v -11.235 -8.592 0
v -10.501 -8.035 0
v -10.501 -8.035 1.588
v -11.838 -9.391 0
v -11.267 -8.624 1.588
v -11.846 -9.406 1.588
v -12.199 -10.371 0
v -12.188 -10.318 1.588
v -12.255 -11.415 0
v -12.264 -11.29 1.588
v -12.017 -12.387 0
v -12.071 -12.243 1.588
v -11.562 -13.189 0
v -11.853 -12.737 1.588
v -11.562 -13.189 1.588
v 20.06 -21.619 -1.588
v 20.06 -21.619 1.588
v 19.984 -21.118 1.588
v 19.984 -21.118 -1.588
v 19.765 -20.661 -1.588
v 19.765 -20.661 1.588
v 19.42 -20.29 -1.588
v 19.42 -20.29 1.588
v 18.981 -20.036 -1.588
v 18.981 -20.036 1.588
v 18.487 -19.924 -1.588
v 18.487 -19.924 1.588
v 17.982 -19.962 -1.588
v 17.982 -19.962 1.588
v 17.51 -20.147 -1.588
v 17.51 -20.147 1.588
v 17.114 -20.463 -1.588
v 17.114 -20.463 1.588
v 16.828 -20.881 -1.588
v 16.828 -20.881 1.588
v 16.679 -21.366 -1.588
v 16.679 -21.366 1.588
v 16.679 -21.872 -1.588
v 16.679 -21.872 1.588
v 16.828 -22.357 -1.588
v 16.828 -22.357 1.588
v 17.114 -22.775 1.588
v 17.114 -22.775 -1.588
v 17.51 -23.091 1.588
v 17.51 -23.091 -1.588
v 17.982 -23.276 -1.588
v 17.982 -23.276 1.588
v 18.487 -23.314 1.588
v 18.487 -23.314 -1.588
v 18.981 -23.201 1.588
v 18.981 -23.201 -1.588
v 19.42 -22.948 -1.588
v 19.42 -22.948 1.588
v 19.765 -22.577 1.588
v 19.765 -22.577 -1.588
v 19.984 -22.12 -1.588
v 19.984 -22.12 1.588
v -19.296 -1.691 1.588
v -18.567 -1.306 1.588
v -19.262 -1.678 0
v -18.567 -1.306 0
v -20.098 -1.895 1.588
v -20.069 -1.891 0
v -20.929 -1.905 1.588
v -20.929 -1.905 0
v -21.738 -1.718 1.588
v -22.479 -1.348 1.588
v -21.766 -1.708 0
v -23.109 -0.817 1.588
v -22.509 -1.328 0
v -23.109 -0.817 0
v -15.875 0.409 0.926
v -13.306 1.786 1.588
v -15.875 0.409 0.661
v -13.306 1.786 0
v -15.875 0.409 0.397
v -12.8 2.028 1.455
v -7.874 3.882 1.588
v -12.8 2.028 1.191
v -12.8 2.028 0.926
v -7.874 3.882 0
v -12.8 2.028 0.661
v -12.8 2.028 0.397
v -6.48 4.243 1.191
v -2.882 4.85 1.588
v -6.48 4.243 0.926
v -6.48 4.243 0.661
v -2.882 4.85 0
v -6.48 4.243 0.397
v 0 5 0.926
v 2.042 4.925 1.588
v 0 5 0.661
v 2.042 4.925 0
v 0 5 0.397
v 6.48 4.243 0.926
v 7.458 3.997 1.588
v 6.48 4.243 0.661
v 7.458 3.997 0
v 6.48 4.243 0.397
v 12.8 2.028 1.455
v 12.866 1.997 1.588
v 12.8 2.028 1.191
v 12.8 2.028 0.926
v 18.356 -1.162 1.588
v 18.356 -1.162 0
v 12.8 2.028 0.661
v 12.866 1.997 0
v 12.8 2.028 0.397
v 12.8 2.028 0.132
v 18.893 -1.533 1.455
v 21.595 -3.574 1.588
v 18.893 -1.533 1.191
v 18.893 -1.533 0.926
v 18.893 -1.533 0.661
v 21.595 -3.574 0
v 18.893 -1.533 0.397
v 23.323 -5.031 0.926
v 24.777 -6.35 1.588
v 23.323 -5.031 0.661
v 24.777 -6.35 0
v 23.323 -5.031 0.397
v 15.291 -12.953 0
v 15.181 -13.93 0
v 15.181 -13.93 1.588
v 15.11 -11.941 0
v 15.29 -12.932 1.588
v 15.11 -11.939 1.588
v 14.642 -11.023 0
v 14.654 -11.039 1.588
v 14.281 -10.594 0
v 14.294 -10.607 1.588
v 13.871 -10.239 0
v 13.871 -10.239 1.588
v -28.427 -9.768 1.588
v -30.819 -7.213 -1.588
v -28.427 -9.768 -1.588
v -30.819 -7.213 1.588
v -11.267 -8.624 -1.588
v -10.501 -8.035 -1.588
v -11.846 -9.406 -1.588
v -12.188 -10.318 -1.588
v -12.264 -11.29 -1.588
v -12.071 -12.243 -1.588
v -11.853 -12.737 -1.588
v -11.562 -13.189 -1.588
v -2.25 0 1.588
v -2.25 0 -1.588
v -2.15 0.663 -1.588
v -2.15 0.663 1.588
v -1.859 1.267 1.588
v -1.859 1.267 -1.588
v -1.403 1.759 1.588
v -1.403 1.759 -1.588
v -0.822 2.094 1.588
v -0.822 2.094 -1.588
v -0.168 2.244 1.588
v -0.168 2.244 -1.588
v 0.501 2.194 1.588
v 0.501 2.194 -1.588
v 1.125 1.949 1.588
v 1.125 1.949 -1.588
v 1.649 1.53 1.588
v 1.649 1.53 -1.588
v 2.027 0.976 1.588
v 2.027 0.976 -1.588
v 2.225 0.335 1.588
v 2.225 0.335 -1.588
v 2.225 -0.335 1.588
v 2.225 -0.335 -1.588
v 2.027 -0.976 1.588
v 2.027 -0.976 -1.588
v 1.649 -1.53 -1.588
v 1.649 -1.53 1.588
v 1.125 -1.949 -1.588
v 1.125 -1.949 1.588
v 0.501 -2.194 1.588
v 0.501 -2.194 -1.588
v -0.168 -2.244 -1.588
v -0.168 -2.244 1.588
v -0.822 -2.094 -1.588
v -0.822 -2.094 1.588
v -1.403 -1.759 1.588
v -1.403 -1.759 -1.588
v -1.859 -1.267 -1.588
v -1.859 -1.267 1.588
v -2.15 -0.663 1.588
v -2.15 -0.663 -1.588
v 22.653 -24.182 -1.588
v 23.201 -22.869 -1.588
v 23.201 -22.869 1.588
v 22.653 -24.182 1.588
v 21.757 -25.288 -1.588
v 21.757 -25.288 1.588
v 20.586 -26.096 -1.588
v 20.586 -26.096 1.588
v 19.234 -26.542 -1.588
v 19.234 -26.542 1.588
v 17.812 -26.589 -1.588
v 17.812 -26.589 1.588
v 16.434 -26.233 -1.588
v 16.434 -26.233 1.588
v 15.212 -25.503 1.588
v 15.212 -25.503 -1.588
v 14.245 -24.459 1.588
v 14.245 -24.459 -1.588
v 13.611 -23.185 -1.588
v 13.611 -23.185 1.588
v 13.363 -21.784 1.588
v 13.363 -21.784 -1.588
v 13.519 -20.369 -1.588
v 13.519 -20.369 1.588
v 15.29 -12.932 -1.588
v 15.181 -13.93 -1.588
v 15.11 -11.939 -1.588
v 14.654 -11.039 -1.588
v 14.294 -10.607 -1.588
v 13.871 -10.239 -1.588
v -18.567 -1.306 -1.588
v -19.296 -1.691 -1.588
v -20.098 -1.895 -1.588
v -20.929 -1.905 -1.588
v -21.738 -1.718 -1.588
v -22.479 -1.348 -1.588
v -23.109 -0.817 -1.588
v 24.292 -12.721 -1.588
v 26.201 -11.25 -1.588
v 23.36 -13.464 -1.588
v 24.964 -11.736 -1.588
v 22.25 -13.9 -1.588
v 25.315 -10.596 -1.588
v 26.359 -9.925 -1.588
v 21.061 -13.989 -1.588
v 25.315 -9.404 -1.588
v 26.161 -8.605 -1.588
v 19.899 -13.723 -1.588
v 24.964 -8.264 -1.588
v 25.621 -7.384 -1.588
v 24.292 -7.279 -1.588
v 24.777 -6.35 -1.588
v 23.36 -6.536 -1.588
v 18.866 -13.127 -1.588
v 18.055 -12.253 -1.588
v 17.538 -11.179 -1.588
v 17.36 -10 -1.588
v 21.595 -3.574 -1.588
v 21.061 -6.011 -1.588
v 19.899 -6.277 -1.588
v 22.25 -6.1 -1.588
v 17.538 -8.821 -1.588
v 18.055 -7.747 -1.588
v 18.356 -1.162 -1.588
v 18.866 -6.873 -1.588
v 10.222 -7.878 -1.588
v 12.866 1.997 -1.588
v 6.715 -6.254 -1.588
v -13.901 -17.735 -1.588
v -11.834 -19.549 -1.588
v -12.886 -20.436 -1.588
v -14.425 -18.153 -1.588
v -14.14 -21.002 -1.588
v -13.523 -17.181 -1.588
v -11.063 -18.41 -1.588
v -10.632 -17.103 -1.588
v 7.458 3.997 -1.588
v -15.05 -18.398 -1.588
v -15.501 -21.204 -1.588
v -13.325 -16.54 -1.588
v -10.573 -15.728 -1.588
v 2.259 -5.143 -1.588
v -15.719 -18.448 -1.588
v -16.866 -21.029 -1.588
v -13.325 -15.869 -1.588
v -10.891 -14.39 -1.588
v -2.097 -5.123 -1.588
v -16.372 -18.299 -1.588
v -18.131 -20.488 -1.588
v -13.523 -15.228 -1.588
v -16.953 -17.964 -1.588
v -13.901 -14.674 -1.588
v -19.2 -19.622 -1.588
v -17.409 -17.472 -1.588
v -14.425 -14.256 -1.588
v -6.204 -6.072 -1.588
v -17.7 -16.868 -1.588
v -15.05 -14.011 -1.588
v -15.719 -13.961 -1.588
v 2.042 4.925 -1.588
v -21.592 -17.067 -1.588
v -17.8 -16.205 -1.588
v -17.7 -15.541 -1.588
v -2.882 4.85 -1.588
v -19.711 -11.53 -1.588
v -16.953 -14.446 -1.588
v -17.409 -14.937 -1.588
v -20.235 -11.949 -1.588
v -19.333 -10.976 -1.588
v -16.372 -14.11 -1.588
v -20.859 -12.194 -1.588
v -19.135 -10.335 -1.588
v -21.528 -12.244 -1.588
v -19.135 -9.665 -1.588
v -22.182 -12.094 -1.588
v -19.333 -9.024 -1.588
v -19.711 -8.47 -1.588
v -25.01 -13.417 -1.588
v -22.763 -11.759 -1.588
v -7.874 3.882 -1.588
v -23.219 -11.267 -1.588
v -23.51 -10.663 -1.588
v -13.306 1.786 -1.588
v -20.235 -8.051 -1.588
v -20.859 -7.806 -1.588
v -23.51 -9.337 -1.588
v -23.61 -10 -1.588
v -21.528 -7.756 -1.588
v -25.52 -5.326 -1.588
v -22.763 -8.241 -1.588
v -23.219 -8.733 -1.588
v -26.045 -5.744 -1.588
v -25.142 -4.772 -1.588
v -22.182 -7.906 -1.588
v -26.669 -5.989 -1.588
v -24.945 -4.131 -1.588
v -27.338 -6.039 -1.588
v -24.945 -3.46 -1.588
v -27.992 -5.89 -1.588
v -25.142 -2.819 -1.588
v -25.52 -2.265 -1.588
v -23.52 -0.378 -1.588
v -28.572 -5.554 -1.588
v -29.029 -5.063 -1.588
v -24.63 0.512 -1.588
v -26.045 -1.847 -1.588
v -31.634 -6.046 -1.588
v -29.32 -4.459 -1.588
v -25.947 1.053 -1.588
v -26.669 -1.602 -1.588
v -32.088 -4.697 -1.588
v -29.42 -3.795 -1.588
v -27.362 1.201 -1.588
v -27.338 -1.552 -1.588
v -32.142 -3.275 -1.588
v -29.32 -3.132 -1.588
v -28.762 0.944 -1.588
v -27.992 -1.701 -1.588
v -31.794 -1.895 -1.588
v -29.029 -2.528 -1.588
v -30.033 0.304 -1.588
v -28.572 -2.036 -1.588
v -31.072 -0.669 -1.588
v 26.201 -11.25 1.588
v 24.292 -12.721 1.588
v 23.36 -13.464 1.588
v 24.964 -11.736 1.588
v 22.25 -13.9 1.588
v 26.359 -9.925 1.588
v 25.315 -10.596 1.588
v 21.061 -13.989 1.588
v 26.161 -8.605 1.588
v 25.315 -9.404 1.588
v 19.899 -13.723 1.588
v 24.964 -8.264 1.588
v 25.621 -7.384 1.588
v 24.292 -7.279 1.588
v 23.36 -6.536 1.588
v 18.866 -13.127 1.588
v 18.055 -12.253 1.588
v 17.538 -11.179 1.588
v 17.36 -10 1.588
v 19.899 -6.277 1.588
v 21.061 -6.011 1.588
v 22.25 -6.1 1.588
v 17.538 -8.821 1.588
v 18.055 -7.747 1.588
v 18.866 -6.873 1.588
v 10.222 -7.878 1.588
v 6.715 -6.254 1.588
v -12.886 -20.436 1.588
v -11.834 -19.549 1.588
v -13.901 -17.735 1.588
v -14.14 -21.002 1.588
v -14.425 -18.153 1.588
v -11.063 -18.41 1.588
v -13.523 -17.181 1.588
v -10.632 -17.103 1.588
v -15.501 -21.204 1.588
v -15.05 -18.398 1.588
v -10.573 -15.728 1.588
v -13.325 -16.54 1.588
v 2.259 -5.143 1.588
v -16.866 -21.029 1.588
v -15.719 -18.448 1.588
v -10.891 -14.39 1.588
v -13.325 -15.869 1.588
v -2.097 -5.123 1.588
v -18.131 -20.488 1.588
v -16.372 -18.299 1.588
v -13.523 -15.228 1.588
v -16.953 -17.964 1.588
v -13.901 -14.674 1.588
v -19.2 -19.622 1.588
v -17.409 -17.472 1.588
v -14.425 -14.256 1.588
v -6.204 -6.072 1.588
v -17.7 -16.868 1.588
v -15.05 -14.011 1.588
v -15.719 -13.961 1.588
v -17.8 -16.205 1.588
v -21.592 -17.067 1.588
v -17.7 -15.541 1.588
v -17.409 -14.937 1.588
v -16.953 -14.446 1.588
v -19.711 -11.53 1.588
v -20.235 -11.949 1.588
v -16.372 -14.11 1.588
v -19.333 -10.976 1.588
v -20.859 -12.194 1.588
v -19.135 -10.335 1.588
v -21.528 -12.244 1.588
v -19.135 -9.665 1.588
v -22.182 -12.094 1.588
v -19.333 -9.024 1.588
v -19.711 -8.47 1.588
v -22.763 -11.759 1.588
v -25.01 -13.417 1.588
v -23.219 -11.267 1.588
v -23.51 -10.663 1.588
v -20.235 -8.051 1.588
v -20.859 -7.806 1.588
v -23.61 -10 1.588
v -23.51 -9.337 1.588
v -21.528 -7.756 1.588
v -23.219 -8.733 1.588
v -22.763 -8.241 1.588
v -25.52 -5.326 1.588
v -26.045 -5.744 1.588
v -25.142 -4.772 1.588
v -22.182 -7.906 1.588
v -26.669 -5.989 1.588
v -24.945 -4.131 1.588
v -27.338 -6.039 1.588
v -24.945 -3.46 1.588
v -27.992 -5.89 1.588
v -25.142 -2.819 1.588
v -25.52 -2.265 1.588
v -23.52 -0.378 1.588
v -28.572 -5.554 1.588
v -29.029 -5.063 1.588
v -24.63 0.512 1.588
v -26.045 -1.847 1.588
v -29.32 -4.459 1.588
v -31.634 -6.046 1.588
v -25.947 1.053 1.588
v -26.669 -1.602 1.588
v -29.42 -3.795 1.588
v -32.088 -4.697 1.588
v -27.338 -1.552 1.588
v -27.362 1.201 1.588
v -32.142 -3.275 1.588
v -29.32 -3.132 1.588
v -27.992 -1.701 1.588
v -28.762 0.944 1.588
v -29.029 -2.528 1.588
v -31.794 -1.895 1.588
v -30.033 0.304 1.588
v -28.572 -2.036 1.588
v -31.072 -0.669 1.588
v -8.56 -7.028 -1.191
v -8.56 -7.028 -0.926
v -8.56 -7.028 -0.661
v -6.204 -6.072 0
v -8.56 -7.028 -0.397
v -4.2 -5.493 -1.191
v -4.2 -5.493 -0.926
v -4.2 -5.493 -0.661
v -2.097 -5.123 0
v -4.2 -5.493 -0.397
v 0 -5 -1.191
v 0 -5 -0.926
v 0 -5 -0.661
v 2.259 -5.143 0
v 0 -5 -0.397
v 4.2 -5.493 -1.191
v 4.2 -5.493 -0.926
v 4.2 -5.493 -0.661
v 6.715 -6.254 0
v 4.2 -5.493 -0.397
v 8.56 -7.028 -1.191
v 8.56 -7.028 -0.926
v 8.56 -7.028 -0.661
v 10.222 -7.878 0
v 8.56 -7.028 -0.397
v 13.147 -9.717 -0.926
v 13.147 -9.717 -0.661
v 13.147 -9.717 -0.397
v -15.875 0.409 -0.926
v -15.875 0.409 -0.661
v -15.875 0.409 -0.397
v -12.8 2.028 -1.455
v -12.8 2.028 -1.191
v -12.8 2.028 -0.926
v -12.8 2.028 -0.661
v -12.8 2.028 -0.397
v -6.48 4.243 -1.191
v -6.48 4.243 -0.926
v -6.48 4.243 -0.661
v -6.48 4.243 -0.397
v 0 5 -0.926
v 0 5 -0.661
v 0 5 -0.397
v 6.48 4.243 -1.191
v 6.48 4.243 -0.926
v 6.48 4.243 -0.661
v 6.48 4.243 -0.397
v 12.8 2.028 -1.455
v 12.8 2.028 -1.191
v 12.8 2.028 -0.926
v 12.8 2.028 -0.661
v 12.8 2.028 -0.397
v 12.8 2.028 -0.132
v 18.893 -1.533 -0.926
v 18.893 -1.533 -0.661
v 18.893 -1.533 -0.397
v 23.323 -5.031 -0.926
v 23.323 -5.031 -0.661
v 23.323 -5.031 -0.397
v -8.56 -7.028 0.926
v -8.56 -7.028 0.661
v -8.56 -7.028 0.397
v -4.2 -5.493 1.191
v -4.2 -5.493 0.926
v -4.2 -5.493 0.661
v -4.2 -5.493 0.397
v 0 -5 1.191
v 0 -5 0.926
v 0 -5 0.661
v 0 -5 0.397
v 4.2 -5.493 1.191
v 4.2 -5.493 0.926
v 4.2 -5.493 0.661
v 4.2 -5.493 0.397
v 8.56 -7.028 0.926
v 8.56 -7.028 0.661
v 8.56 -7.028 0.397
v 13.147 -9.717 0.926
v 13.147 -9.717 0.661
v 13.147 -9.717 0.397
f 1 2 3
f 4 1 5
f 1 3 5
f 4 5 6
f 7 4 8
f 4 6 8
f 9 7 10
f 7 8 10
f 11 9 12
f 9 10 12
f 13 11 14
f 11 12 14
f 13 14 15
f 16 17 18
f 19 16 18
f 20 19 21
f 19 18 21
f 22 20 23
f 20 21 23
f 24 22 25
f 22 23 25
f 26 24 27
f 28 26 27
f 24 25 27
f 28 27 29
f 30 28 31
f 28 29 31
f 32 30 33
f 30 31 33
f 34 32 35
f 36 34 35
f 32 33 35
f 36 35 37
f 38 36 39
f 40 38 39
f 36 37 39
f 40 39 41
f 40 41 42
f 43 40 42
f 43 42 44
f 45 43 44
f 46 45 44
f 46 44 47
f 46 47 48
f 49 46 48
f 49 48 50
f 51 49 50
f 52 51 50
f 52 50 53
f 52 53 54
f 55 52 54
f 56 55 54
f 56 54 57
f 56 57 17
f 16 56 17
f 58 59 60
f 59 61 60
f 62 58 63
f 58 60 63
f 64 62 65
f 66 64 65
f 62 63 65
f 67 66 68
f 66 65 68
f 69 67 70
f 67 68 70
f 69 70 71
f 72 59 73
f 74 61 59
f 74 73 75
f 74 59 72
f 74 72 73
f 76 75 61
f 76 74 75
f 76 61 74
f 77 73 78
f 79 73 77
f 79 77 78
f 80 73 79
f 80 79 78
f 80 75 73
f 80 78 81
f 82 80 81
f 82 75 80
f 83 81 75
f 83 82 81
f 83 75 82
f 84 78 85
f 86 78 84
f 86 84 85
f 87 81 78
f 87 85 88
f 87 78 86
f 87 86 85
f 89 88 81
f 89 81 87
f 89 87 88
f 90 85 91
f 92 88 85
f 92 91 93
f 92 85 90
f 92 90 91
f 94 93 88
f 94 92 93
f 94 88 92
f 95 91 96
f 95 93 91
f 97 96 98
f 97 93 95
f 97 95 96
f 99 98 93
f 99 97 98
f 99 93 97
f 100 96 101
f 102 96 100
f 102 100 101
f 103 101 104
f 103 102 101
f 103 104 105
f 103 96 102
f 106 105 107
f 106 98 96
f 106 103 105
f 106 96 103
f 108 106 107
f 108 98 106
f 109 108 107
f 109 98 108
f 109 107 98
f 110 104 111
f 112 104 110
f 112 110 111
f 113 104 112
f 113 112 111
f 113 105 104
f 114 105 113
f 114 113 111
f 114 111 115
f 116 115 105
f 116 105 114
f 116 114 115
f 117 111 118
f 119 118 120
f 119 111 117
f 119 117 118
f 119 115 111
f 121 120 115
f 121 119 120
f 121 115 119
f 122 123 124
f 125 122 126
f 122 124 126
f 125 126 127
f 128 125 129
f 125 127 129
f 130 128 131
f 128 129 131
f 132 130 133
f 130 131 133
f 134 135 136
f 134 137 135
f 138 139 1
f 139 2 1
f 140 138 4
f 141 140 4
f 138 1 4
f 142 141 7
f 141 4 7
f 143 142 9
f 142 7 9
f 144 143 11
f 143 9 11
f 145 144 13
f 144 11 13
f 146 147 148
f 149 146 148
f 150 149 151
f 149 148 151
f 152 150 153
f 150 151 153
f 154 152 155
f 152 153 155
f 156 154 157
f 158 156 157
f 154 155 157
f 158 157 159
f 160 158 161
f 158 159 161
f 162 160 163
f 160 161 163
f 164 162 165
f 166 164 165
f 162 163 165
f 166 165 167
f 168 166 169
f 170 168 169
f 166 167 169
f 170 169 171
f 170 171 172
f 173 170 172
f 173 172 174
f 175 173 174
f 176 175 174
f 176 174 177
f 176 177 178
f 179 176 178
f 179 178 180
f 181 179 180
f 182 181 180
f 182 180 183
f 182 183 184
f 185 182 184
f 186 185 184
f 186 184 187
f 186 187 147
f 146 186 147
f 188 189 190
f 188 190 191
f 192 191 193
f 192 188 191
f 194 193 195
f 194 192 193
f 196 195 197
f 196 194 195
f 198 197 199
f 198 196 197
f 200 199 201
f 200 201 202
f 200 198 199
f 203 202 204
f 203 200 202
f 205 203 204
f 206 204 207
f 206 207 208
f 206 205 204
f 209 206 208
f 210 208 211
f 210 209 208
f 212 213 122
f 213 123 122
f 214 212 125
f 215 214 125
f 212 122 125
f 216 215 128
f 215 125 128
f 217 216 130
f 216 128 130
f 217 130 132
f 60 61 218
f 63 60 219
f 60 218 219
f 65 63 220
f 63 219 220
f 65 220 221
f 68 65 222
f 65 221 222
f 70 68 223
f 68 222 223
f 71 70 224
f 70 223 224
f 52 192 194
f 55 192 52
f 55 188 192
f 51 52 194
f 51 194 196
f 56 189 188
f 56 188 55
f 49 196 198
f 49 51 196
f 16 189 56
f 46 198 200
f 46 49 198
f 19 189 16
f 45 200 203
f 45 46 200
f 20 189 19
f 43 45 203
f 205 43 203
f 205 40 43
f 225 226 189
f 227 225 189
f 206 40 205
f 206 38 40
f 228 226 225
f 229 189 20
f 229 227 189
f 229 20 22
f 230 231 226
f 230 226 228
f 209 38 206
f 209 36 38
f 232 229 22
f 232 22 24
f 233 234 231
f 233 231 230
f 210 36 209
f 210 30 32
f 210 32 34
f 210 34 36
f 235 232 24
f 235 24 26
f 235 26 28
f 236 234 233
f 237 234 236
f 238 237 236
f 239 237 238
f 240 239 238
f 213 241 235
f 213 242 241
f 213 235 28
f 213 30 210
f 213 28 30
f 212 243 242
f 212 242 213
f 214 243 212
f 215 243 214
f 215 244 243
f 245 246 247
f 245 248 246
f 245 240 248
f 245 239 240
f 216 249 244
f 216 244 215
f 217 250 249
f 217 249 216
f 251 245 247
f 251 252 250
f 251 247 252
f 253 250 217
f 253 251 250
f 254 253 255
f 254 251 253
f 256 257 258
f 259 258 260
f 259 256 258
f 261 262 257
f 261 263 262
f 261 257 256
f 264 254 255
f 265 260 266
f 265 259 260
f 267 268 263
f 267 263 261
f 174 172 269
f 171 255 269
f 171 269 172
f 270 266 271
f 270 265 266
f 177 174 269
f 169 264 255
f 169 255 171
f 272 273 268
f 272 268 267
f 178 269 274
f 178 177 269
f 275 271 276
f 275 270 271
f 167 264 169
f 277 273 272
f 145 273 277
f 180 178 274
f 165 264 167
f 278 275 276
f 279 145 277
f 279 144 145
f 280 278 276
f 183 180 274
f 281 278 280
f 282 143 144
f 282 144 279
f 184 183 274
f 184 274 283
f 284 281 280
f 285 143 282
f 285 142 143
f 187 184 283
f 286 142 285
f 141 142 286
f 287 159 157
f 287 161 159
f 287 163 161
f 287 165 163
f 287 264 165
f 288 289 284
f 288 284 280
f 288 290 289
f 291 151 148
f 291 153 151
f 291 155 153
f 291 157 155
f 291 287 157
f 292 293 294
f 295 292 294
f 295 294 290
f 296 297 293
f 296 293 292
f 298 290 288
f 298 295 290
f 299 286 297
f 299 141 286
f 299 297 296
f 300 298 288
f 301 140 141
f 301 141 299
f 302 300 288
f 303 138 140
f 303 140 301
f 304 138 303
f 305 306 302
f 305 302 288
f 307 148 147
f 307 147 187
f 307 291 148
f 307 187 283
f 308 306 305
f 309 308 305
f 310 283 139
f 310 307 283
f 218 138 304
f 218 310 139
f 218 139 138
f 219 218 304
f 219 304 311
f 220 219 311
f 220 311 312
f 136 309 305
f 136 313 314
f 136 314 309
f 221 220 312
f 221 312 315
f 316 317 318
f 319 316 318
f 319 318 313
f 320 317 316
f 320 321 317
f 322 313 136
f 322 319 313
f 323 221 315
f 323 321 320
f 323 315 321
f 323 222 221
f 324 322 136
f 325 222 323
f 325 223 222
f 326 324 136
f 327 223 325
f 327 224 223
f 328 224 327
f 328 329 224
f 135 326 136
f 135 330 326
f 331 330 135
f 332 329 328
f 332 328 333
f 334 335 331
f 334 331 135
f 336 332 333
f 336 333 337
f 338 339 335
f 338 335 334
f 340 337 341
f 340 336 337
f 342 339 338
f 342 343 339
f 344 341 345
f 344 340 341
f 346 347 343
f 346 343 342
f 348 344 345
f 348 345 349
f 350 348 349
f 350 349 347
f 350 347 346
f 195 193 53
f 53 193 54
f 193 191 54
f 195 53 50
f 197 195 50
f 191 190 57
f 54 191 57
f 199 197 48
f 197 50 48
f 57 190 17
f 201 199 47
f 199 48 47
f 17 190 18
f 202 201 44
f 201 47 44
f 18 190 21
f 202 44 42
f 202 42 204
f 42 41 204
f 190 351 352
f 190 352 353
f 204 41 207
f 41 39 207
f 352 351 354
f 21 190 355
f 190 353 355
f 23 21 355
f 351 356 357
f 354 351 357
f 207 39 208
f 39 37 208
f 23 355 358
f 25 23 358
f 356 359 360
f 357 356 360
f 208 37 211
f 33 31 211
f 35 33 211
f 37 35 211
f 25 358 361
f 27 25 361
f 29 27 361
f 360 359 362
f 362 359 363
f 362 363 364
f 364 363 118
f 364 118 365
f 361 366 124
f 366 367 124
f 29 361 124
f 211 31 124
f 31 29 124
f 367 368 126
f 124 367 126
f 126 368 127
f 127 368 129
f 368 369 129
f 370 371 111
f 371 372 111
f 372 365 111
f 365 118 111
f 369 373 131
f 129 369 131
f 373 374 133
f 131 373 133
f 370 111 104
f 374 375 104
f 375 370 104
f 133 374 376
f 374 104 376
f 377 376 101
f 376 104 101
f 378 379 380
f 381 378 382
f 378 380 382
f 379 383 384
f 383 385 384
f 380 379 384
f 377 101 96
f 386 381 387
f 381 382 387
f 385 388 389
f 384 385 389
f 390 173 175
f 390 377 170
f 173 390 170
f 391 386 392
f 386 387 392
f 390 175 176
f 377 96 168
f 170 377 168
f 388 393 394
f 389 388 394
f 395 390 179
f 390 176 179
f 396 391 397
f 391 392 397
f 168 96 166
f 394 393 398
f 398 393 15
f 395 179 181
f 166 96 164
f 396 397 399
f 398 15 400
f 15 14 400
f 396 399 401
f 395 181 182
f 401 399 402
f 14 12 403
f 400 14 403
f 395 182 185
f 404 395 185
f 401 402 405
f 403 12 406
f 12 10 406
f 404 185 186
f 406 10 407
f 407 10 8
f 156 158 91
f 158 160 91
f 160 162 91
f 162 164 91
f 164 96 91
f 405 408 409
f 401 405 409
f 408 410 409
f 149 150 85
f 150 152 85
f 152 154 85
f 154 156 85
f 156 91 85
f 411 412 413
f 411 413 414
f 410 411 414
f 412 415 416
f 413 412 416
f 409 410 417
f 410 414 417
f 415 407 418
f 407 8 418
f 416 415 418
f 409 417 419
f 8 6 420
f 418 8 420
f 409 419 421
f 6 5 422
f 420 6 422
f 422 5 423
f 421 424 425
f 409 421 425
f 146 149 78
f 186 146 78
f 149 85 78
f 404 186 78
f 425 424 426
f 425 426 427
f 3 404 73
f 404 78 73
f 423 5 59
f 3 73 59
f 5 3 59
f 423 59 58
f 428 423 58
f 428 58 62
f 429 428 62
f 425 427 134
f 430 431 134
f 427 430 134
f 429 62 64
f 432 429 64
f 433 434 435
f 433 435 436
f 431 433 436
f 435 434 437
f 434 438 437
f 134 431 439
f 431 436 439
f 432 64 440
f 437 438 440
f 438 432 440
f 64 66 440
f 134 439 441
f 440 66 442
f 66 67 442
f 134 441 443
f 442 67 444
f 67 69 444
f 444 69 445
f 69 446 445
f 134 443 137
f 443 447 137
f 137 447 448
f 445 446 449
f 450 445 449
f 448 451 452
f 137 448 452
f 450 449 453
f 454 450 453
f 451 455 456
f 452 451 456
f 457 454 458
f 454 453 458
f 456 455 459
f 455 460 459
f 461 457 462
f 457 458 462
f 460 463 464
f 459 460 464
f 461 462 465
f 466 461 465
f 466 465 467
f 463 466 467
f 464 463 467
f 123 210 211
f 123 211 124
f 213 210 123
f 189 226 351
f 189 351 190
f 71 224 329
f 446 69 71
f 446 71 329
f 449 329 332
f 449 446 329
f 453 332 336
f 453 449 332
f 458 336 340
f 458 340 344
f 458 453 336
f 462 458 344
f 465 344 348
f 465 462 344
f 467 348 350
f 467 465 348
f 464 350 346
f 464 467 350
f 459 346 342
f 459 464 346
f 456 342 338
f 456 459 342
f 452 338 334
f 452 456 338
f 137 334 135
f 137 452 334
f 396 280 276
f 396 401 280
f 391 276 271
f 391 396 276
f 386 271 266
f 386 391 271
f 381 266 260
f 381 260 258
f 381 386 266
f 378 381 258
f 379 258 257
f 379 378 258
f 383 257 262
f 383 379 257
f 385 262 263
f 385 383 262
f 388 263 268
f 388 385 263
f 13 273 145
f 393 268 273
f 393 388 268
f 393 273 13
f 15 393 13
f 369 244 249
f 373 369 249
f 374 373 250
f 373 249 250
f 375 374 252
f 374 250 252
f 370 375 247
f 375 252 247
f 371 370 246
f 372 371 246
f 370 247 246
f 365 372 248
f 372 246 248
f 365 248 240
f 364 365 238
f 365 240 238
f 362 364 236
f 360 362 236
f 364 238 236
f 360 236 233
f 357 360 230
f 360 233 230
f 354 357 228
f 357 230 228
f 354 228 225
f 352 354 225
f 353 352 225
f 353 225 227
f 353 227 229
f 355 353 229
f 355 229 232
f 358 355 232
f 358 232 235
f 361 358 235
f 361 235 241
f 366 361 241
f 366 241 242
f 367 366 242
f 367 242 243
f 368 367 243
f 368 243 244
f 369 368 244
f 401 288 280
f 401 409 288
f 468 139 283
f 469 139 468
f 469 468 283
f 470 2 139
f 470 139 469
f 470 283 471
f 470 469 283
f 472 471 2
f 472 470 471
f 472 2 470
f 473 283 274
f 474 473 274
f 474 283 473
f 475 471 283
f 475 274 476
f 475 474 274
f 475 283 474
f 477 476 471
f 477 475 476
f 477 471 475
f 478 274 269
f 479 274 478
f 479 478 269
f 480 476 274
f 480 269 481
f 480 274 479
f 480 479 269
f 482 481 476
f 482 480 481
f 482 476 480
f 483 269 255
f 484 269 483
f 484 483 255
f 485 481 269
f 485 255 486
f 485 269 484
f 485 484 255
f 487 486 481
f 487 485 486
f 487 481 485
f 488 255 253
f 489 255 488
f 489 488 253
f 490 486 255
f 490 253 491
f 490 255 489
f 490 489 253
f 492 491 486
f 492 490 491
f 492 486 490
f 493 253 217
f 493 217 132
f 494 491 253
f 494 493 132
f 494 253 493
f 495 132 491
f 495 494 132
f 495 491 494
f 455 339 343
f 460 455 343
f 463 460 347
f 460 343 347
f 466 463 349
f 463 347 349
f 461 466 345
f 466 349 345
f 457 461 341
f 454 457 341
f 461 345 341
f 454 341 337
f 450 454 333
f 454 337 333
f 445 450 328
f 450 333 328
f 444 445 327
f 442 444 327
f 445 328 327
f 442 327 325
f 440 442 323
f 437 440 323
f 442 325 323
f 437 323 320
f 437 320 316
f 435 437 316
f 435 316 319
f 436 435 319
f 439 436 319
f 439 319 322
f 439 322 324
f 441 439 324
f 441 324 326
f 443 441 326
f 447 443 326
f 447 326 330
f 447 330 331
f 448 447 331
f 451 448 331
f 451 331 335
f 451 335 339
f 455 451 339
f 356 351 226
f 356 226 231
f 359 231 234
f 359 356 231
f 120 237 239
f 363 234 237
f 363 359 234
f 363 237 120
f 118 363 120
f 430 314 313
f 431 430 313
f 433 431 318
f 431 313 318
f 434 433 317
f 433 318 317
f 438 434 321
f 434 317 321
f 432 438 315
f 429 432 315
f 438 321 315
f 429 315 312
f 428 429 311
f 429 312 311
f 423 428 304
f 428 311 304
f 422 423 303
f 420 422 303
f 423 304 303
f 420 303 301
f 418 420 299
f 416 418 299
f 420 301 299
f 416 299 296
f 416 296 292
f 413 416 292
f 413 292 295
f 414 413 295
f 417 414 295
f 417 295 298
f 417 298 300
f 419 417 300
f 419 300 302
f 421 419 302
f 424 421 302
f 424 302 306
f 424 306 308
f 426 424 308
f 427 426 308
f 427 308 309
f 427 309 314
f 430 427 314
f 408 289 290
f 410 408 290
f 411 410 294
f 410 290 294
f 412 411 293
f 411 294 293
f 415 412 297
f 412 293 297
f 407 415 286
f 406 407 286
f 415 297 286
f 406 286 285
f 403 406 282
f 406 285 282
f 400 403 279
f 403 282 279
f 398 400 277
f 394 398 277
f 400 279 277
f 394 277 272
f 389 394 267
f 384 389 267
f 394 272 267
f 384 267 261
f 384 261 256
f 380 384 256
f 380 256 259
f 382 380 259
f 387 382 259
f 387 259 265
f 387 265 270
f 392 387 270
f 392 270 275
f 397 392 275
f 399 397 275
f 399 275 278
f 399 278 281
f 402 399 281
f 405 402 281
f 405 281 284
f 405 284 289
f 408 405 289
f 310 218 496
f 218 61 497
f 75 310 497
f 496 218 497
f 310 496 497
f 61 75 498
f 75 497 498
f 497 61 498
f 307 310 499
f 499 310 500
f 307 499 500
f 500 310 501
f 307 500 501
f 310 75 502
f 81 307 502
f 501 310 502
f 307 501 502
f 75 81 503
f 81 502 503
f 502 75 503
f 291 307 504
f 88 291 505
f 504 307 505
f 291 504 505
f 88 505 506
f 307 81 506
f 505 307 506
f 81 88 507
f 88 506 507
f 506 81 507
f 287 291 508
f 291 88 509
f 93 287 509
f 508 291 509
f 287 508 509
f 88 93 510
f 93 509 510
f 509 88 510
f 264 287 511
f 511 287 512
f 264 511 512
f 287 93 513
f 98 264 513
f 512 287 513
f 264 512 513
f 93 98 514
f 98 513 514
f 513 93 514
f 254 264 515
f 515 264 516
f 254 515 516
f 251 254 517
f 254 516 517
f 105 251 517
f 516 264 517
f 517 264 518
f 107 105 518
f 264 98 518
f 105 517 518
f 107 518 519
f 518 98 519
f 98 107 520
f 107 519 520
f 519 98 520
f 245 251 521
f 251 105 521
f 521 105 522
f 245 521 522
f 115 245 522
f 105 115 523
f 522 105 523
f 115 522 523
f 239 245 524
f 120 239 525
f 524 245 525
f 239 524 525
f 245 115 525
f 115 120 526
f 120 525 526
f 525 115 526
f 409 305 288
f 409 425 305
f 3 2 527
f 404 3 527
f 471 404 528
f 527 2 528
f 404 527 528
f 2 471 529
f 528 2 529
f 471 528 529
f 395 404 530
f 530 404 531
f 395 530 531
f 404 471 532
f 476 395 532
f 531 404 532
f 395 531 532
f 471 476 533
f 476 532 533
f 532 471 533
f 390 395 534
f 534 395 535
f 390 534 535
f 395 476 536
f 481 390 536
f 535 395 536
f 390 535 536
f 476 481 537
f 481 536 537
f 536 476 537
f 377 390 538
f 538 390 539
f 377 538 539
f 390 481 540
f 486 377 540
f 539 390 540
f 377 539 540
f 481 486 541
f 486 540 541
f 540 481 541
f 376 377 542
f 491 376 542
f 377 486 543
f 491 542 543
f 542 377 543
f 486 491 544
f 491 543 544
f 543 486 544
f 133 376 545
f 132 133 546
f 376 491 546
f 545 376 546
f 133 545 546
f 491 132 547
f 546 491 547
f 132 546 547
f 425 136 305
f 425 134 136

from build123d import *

# Parameters (mm, degrees)
BOSS_EXTRUDE1_DEPTH  = 1.5875
M4_CLEARANCE_HOLE1_D = 4.5
BOSS_EXTRUDE2_DEPTH  = 3.175
M3_CLEARANCE_HOLE1_D = 3.4
FILLET1_R            = 3.5
SKETCH8_R            = 4
CUT_EXTRUDE1_DEPTH   = 4.1750001


with BuildPart() as part:
    # Sketch2 → Boss-Extrude1 (new body, symmetric)
    with BuildSketch(Plane.XY):
        with BuildLine():
            add(Edge.make_bspline(
                [(-24.777431429, -6.350183234), (-24.299810251, -5.902972393), (-23.32289496, -5.01651393), (-22.058866471, -3.944003435), (-21.276036232, -3.316259916), (-20.98344634, -3.086723573)],
                knots=[0, 0, 0, 0, 0.03125, 0.0625, 0.081068463, 0.081068463, 0.081068463, 0.081068463], degree=3))
            Line((-24.777431429, -6.350183234), (-21.36, -10))
            add(Edge.make_bspline(
                [(-21.36, -10), (-20.09052587, -8.81135381), (-18.821051739, -7.728673603), (-17.551577609, -6.751959378)],
                knots=[0, 0, 0, 0, 0.089148464, 0.089148464, 0.089148464, 0.089148464], degree=3))
            Line((-17.551577609, -6.751959378), (-20.98344634, -3.086723573))
        make_face()
        with BuildLine():
            Line((-21.36, -10), (-24.777431429, -6.350183234))
            ThreePointArc((-24.777431429, -6.350183234), (-26.357299125, -9.8356788), (-25.009816701, -13.417431499))
            ThreePointArc((-25.009816701, -13.417431499), (-21.5243212, -14.997299125), (-17.942568571, -13.649816766))
            Line((-17.942568571, -13.649816766), (-21.36, -10))
        make_face()
        with BuildLine():
            ThreePointArc((-25.009816701, -13.417431499), (-26.357299125, -9.8356788), (-24.777431429, -6.350183234))
            add(Edge.make_bspline(
                [(-24.777431429, -6.350183234), (-24.299810251, -5.902972393), (-23.32289496, -5.01651393), (-22.058866471, -3.944003435), (-21.276036232, -3.316259916), (-20.98344634, -3.086723573)],
                knots=[0, 0, 0, 0, 0.03125, 0.0625, 0.081068463, 0.081068463, 0.081068463, 0.081068463], degree=3))
            Line((-20.98344634, -3.086723573), (-21.127614663, -2.932751805))
            Line((-21.127614663, -2.932751805), (-23.519816663, -0.377880068))
            ThreePointArc((-23.519816663, -0.377880068), (-30.587064859, -0.145494731), (-30.819450196, -7.212742926))
            Line((-30.819450196, -7.212742926), (-28.427248195, -9.767614663))
            Line((-28.427248195, -9.767614663), (-25.009816701, -13.417431499))
        make_face()
        with BuildLine():
            add(Edge.make_bspline(
                [(-21.36, -10), (-20.09052587, -8.81135381), (-18.821051739, -7.728673603), (-17.551577609, -6.751959378)],
                knots=[0, 0, 0, 0, 0.089148464, 0.089148464, 0.089148464, 0.089148464], degree=3))
            Line((-21.36, -10), (-17.942568571, -13.649816766))
            add(Edge.make_bspline(
                [(-17.942568571, -13.649816766), (-17.543072686, -13.275756949), (-16.7212792, -12.530114496), (-15.44829951, -11.450473224), (-14.582019434, -10.770813046), (-14.116024052, -10.421130577)],
                knots=[0, 0, 0, 0, 0.03125, 0.0625, 0.099339971, 0.099339971, 0.099339971, 0.099339971], degree=3))
            Line((-14.116024052, -10.421130577), (-14.292751805, -10.232385337))
            Line((-14.292751805, -10.232385337), (-17.551577609, -6.751959378))
        make_face()
        with BuildLine():
            ThreePointArc((-17.942568571, -13.649816766), (-21.5243212, -14.997299125), (-25.009816701, -13.417431499))
            Line((-25.009816701, -13.417431499), (-21.592385337, -17.067248195))
            Line((-21.592385337, -17.067248195), (-19.200183337, -19.622119932))
            ThreePointArc((-19.200183337, -19.622119932), (-12.132935141, -19.854505269), (-11.900549804, -12.787257074))
            Line((-11.900549804, -12.787257074), (-14.116024052, -10.421130577))
            add(Edge.make_bspline(
                [(-17.942568571, -13.649816766), (-17.543072686, -13.275756949), (-16.7212792, -12.530114496), (-15.44829951, -11.450473224), (-14.582019434, -10.770813046), (-14.116024052, -10.421130577)],
                knots=[0, 0, 0, 0, 0.03125, 0.0625, 0.099339971, 0.099339971, 0.099339971, 0.099339971], degree=3))
        make_face()
        with BuildLine():
            add(Edge.make_bspline(
                [(-20.98344634, -3.086723573), (-20.291201445, -2.543658465), (-18.603117827, -1.28817338), (-15.885096675, 0.462779531), (-11.785009924, 2.624744664), (-6.509375137, 4.48808894), (0, 5.25595553), (6.509375137, 4.48808894), (11.785009924, 2.624744664), (15.885096675, 0.462779531), (18.901874802, -1.480633029), (21.37388106, -3.362802893), (23.32289496, -5.01651393), (24.299810251, -5.902972393), (24.777431429, -6.350183234)],
                knots=[0.081068463, 0.081068463, 0.081068463, 0.081068463, 0.125, 0.1875, 0.25, 0.375, 0.5, 0.625, 0.75, 0.8125, 0.875, 0.9375, 0.96875, 1, 1, 1, 1], degree=3))
            Line((-20.98344634, -3.086723573), (-17.551577609, -6.751959378))
            Line((-17.551577609, -6.751959378), (-14.292751805, -10.232385337))
            Line((-14.292751805, -10.232385337), (-14.116024052, -10.421130577))
            add(Edge.make_bspline(
                [(-14.116024052, -10.421130577), (-13.791445759, -10.177567349), (-12.680801028, -9.370838959), (-10.815202086, -8.171392792), (-7.794818062, -6.582915934), (-4.170679183, -5.321481205), (0, -4.839259398), (4.170679183, -5.321481205), (7.794818062, -6.582915934), (10.815202086, -8.171392792), (13.136984474, -9.664132159), (15.119482265, -11.171596294), (16.7212792, -12.530114496), (17.543072686, -13.275756949), (17.942568571, -13.649816766)],
                knots=[0.099339971, 0.099339971, 0.099339971, 0.099339971, 0.125, 0.1875, 0.25, 0.375, 0.5, 0.625, 0.75, 0.8125, 0.875, 0.9375, 0.96875, 1, 1, 1, 1], degree=3))
            ThreePointArc((17.942568571, -13.649816766), (25.009816766, -13.417431429), (24.777431429, -6.350183234))
        make_face()
    extrude(amount=BOSS_EXTRUDE1_DEPTH, both=True)

    # M4 Clearance Hole1 (through all)
    with Locations(Plane.XY.offset(1.5875)):
        with Locations((-21.359999999, -9.999999999), (0, 0), (-15.550366571, -16.204688503), (-27.169633429, -3.795311497)):
            Hole(M4_CLEARANCE_HOLE1_D / 2)

    # Sketch5 → Boss-Extrude2 (add)
    with BuildSketch(Plane(origin=(0, 0, -1.5875), x_dir=(-1, 0, 0), z_dir=(0, 0, -1))):
        with BuildLine():
            ThreePointArc((-23.201229183, -22.868950039), (-17.11, -26.460179221), (-13.518770817, -20.368950039))
            Line((-13.518770817, -20.368950039), (-16.518770817, -8.75))
            ThreePointArc((-16.518770817, -8.75), (-22.61, -5.158770817), (-26.201229183, -11.25))
            Line((-26.201229183, -11.25), (-23.201229183, -22.868950039))
        make_face()
    extrude(amount=-BOSS_EXTRUDE2_DEPTH)

    # M3 Clearance Hole1 (through all)
    with Locations(Plane(origin=(0, 0, -1.5875), x_dir=(-1, 0, 0), z_dir=(0, 0, -1))):
        with Locations((-18.36, -21.618950039)):
            Hole(M3_CLEARANCE_HOLE1_D / 2)

    # Fillet1
    fillet1_edges = [part.edges().sort_by_distance(p)[0] for p in [
        (15.75315909, -11.715201468, -0.79375),
        (-20.98344634, -3.086723573, -0.79375),
        (-14.116024052, -10.421130577, 0.79375),
    ]]
    fillet(fillet1_edges, radius=FILLET1_R)

    # Sketch8 → Cut-Extrude1 (cut, through all)
    with BuildSketch(Plane(origin=(0, 0, -1.5875), x_dir=(-1, 0, 0), z_dir=(0, 0, -1))):
        with Locations((-21.36, -10)):
            Circle(SKETCH8_R)
    extrude(amount=-CUT_EXTRUDE1_DEPTH, mode=Mode.SUBTRACT)


solid = part.part
